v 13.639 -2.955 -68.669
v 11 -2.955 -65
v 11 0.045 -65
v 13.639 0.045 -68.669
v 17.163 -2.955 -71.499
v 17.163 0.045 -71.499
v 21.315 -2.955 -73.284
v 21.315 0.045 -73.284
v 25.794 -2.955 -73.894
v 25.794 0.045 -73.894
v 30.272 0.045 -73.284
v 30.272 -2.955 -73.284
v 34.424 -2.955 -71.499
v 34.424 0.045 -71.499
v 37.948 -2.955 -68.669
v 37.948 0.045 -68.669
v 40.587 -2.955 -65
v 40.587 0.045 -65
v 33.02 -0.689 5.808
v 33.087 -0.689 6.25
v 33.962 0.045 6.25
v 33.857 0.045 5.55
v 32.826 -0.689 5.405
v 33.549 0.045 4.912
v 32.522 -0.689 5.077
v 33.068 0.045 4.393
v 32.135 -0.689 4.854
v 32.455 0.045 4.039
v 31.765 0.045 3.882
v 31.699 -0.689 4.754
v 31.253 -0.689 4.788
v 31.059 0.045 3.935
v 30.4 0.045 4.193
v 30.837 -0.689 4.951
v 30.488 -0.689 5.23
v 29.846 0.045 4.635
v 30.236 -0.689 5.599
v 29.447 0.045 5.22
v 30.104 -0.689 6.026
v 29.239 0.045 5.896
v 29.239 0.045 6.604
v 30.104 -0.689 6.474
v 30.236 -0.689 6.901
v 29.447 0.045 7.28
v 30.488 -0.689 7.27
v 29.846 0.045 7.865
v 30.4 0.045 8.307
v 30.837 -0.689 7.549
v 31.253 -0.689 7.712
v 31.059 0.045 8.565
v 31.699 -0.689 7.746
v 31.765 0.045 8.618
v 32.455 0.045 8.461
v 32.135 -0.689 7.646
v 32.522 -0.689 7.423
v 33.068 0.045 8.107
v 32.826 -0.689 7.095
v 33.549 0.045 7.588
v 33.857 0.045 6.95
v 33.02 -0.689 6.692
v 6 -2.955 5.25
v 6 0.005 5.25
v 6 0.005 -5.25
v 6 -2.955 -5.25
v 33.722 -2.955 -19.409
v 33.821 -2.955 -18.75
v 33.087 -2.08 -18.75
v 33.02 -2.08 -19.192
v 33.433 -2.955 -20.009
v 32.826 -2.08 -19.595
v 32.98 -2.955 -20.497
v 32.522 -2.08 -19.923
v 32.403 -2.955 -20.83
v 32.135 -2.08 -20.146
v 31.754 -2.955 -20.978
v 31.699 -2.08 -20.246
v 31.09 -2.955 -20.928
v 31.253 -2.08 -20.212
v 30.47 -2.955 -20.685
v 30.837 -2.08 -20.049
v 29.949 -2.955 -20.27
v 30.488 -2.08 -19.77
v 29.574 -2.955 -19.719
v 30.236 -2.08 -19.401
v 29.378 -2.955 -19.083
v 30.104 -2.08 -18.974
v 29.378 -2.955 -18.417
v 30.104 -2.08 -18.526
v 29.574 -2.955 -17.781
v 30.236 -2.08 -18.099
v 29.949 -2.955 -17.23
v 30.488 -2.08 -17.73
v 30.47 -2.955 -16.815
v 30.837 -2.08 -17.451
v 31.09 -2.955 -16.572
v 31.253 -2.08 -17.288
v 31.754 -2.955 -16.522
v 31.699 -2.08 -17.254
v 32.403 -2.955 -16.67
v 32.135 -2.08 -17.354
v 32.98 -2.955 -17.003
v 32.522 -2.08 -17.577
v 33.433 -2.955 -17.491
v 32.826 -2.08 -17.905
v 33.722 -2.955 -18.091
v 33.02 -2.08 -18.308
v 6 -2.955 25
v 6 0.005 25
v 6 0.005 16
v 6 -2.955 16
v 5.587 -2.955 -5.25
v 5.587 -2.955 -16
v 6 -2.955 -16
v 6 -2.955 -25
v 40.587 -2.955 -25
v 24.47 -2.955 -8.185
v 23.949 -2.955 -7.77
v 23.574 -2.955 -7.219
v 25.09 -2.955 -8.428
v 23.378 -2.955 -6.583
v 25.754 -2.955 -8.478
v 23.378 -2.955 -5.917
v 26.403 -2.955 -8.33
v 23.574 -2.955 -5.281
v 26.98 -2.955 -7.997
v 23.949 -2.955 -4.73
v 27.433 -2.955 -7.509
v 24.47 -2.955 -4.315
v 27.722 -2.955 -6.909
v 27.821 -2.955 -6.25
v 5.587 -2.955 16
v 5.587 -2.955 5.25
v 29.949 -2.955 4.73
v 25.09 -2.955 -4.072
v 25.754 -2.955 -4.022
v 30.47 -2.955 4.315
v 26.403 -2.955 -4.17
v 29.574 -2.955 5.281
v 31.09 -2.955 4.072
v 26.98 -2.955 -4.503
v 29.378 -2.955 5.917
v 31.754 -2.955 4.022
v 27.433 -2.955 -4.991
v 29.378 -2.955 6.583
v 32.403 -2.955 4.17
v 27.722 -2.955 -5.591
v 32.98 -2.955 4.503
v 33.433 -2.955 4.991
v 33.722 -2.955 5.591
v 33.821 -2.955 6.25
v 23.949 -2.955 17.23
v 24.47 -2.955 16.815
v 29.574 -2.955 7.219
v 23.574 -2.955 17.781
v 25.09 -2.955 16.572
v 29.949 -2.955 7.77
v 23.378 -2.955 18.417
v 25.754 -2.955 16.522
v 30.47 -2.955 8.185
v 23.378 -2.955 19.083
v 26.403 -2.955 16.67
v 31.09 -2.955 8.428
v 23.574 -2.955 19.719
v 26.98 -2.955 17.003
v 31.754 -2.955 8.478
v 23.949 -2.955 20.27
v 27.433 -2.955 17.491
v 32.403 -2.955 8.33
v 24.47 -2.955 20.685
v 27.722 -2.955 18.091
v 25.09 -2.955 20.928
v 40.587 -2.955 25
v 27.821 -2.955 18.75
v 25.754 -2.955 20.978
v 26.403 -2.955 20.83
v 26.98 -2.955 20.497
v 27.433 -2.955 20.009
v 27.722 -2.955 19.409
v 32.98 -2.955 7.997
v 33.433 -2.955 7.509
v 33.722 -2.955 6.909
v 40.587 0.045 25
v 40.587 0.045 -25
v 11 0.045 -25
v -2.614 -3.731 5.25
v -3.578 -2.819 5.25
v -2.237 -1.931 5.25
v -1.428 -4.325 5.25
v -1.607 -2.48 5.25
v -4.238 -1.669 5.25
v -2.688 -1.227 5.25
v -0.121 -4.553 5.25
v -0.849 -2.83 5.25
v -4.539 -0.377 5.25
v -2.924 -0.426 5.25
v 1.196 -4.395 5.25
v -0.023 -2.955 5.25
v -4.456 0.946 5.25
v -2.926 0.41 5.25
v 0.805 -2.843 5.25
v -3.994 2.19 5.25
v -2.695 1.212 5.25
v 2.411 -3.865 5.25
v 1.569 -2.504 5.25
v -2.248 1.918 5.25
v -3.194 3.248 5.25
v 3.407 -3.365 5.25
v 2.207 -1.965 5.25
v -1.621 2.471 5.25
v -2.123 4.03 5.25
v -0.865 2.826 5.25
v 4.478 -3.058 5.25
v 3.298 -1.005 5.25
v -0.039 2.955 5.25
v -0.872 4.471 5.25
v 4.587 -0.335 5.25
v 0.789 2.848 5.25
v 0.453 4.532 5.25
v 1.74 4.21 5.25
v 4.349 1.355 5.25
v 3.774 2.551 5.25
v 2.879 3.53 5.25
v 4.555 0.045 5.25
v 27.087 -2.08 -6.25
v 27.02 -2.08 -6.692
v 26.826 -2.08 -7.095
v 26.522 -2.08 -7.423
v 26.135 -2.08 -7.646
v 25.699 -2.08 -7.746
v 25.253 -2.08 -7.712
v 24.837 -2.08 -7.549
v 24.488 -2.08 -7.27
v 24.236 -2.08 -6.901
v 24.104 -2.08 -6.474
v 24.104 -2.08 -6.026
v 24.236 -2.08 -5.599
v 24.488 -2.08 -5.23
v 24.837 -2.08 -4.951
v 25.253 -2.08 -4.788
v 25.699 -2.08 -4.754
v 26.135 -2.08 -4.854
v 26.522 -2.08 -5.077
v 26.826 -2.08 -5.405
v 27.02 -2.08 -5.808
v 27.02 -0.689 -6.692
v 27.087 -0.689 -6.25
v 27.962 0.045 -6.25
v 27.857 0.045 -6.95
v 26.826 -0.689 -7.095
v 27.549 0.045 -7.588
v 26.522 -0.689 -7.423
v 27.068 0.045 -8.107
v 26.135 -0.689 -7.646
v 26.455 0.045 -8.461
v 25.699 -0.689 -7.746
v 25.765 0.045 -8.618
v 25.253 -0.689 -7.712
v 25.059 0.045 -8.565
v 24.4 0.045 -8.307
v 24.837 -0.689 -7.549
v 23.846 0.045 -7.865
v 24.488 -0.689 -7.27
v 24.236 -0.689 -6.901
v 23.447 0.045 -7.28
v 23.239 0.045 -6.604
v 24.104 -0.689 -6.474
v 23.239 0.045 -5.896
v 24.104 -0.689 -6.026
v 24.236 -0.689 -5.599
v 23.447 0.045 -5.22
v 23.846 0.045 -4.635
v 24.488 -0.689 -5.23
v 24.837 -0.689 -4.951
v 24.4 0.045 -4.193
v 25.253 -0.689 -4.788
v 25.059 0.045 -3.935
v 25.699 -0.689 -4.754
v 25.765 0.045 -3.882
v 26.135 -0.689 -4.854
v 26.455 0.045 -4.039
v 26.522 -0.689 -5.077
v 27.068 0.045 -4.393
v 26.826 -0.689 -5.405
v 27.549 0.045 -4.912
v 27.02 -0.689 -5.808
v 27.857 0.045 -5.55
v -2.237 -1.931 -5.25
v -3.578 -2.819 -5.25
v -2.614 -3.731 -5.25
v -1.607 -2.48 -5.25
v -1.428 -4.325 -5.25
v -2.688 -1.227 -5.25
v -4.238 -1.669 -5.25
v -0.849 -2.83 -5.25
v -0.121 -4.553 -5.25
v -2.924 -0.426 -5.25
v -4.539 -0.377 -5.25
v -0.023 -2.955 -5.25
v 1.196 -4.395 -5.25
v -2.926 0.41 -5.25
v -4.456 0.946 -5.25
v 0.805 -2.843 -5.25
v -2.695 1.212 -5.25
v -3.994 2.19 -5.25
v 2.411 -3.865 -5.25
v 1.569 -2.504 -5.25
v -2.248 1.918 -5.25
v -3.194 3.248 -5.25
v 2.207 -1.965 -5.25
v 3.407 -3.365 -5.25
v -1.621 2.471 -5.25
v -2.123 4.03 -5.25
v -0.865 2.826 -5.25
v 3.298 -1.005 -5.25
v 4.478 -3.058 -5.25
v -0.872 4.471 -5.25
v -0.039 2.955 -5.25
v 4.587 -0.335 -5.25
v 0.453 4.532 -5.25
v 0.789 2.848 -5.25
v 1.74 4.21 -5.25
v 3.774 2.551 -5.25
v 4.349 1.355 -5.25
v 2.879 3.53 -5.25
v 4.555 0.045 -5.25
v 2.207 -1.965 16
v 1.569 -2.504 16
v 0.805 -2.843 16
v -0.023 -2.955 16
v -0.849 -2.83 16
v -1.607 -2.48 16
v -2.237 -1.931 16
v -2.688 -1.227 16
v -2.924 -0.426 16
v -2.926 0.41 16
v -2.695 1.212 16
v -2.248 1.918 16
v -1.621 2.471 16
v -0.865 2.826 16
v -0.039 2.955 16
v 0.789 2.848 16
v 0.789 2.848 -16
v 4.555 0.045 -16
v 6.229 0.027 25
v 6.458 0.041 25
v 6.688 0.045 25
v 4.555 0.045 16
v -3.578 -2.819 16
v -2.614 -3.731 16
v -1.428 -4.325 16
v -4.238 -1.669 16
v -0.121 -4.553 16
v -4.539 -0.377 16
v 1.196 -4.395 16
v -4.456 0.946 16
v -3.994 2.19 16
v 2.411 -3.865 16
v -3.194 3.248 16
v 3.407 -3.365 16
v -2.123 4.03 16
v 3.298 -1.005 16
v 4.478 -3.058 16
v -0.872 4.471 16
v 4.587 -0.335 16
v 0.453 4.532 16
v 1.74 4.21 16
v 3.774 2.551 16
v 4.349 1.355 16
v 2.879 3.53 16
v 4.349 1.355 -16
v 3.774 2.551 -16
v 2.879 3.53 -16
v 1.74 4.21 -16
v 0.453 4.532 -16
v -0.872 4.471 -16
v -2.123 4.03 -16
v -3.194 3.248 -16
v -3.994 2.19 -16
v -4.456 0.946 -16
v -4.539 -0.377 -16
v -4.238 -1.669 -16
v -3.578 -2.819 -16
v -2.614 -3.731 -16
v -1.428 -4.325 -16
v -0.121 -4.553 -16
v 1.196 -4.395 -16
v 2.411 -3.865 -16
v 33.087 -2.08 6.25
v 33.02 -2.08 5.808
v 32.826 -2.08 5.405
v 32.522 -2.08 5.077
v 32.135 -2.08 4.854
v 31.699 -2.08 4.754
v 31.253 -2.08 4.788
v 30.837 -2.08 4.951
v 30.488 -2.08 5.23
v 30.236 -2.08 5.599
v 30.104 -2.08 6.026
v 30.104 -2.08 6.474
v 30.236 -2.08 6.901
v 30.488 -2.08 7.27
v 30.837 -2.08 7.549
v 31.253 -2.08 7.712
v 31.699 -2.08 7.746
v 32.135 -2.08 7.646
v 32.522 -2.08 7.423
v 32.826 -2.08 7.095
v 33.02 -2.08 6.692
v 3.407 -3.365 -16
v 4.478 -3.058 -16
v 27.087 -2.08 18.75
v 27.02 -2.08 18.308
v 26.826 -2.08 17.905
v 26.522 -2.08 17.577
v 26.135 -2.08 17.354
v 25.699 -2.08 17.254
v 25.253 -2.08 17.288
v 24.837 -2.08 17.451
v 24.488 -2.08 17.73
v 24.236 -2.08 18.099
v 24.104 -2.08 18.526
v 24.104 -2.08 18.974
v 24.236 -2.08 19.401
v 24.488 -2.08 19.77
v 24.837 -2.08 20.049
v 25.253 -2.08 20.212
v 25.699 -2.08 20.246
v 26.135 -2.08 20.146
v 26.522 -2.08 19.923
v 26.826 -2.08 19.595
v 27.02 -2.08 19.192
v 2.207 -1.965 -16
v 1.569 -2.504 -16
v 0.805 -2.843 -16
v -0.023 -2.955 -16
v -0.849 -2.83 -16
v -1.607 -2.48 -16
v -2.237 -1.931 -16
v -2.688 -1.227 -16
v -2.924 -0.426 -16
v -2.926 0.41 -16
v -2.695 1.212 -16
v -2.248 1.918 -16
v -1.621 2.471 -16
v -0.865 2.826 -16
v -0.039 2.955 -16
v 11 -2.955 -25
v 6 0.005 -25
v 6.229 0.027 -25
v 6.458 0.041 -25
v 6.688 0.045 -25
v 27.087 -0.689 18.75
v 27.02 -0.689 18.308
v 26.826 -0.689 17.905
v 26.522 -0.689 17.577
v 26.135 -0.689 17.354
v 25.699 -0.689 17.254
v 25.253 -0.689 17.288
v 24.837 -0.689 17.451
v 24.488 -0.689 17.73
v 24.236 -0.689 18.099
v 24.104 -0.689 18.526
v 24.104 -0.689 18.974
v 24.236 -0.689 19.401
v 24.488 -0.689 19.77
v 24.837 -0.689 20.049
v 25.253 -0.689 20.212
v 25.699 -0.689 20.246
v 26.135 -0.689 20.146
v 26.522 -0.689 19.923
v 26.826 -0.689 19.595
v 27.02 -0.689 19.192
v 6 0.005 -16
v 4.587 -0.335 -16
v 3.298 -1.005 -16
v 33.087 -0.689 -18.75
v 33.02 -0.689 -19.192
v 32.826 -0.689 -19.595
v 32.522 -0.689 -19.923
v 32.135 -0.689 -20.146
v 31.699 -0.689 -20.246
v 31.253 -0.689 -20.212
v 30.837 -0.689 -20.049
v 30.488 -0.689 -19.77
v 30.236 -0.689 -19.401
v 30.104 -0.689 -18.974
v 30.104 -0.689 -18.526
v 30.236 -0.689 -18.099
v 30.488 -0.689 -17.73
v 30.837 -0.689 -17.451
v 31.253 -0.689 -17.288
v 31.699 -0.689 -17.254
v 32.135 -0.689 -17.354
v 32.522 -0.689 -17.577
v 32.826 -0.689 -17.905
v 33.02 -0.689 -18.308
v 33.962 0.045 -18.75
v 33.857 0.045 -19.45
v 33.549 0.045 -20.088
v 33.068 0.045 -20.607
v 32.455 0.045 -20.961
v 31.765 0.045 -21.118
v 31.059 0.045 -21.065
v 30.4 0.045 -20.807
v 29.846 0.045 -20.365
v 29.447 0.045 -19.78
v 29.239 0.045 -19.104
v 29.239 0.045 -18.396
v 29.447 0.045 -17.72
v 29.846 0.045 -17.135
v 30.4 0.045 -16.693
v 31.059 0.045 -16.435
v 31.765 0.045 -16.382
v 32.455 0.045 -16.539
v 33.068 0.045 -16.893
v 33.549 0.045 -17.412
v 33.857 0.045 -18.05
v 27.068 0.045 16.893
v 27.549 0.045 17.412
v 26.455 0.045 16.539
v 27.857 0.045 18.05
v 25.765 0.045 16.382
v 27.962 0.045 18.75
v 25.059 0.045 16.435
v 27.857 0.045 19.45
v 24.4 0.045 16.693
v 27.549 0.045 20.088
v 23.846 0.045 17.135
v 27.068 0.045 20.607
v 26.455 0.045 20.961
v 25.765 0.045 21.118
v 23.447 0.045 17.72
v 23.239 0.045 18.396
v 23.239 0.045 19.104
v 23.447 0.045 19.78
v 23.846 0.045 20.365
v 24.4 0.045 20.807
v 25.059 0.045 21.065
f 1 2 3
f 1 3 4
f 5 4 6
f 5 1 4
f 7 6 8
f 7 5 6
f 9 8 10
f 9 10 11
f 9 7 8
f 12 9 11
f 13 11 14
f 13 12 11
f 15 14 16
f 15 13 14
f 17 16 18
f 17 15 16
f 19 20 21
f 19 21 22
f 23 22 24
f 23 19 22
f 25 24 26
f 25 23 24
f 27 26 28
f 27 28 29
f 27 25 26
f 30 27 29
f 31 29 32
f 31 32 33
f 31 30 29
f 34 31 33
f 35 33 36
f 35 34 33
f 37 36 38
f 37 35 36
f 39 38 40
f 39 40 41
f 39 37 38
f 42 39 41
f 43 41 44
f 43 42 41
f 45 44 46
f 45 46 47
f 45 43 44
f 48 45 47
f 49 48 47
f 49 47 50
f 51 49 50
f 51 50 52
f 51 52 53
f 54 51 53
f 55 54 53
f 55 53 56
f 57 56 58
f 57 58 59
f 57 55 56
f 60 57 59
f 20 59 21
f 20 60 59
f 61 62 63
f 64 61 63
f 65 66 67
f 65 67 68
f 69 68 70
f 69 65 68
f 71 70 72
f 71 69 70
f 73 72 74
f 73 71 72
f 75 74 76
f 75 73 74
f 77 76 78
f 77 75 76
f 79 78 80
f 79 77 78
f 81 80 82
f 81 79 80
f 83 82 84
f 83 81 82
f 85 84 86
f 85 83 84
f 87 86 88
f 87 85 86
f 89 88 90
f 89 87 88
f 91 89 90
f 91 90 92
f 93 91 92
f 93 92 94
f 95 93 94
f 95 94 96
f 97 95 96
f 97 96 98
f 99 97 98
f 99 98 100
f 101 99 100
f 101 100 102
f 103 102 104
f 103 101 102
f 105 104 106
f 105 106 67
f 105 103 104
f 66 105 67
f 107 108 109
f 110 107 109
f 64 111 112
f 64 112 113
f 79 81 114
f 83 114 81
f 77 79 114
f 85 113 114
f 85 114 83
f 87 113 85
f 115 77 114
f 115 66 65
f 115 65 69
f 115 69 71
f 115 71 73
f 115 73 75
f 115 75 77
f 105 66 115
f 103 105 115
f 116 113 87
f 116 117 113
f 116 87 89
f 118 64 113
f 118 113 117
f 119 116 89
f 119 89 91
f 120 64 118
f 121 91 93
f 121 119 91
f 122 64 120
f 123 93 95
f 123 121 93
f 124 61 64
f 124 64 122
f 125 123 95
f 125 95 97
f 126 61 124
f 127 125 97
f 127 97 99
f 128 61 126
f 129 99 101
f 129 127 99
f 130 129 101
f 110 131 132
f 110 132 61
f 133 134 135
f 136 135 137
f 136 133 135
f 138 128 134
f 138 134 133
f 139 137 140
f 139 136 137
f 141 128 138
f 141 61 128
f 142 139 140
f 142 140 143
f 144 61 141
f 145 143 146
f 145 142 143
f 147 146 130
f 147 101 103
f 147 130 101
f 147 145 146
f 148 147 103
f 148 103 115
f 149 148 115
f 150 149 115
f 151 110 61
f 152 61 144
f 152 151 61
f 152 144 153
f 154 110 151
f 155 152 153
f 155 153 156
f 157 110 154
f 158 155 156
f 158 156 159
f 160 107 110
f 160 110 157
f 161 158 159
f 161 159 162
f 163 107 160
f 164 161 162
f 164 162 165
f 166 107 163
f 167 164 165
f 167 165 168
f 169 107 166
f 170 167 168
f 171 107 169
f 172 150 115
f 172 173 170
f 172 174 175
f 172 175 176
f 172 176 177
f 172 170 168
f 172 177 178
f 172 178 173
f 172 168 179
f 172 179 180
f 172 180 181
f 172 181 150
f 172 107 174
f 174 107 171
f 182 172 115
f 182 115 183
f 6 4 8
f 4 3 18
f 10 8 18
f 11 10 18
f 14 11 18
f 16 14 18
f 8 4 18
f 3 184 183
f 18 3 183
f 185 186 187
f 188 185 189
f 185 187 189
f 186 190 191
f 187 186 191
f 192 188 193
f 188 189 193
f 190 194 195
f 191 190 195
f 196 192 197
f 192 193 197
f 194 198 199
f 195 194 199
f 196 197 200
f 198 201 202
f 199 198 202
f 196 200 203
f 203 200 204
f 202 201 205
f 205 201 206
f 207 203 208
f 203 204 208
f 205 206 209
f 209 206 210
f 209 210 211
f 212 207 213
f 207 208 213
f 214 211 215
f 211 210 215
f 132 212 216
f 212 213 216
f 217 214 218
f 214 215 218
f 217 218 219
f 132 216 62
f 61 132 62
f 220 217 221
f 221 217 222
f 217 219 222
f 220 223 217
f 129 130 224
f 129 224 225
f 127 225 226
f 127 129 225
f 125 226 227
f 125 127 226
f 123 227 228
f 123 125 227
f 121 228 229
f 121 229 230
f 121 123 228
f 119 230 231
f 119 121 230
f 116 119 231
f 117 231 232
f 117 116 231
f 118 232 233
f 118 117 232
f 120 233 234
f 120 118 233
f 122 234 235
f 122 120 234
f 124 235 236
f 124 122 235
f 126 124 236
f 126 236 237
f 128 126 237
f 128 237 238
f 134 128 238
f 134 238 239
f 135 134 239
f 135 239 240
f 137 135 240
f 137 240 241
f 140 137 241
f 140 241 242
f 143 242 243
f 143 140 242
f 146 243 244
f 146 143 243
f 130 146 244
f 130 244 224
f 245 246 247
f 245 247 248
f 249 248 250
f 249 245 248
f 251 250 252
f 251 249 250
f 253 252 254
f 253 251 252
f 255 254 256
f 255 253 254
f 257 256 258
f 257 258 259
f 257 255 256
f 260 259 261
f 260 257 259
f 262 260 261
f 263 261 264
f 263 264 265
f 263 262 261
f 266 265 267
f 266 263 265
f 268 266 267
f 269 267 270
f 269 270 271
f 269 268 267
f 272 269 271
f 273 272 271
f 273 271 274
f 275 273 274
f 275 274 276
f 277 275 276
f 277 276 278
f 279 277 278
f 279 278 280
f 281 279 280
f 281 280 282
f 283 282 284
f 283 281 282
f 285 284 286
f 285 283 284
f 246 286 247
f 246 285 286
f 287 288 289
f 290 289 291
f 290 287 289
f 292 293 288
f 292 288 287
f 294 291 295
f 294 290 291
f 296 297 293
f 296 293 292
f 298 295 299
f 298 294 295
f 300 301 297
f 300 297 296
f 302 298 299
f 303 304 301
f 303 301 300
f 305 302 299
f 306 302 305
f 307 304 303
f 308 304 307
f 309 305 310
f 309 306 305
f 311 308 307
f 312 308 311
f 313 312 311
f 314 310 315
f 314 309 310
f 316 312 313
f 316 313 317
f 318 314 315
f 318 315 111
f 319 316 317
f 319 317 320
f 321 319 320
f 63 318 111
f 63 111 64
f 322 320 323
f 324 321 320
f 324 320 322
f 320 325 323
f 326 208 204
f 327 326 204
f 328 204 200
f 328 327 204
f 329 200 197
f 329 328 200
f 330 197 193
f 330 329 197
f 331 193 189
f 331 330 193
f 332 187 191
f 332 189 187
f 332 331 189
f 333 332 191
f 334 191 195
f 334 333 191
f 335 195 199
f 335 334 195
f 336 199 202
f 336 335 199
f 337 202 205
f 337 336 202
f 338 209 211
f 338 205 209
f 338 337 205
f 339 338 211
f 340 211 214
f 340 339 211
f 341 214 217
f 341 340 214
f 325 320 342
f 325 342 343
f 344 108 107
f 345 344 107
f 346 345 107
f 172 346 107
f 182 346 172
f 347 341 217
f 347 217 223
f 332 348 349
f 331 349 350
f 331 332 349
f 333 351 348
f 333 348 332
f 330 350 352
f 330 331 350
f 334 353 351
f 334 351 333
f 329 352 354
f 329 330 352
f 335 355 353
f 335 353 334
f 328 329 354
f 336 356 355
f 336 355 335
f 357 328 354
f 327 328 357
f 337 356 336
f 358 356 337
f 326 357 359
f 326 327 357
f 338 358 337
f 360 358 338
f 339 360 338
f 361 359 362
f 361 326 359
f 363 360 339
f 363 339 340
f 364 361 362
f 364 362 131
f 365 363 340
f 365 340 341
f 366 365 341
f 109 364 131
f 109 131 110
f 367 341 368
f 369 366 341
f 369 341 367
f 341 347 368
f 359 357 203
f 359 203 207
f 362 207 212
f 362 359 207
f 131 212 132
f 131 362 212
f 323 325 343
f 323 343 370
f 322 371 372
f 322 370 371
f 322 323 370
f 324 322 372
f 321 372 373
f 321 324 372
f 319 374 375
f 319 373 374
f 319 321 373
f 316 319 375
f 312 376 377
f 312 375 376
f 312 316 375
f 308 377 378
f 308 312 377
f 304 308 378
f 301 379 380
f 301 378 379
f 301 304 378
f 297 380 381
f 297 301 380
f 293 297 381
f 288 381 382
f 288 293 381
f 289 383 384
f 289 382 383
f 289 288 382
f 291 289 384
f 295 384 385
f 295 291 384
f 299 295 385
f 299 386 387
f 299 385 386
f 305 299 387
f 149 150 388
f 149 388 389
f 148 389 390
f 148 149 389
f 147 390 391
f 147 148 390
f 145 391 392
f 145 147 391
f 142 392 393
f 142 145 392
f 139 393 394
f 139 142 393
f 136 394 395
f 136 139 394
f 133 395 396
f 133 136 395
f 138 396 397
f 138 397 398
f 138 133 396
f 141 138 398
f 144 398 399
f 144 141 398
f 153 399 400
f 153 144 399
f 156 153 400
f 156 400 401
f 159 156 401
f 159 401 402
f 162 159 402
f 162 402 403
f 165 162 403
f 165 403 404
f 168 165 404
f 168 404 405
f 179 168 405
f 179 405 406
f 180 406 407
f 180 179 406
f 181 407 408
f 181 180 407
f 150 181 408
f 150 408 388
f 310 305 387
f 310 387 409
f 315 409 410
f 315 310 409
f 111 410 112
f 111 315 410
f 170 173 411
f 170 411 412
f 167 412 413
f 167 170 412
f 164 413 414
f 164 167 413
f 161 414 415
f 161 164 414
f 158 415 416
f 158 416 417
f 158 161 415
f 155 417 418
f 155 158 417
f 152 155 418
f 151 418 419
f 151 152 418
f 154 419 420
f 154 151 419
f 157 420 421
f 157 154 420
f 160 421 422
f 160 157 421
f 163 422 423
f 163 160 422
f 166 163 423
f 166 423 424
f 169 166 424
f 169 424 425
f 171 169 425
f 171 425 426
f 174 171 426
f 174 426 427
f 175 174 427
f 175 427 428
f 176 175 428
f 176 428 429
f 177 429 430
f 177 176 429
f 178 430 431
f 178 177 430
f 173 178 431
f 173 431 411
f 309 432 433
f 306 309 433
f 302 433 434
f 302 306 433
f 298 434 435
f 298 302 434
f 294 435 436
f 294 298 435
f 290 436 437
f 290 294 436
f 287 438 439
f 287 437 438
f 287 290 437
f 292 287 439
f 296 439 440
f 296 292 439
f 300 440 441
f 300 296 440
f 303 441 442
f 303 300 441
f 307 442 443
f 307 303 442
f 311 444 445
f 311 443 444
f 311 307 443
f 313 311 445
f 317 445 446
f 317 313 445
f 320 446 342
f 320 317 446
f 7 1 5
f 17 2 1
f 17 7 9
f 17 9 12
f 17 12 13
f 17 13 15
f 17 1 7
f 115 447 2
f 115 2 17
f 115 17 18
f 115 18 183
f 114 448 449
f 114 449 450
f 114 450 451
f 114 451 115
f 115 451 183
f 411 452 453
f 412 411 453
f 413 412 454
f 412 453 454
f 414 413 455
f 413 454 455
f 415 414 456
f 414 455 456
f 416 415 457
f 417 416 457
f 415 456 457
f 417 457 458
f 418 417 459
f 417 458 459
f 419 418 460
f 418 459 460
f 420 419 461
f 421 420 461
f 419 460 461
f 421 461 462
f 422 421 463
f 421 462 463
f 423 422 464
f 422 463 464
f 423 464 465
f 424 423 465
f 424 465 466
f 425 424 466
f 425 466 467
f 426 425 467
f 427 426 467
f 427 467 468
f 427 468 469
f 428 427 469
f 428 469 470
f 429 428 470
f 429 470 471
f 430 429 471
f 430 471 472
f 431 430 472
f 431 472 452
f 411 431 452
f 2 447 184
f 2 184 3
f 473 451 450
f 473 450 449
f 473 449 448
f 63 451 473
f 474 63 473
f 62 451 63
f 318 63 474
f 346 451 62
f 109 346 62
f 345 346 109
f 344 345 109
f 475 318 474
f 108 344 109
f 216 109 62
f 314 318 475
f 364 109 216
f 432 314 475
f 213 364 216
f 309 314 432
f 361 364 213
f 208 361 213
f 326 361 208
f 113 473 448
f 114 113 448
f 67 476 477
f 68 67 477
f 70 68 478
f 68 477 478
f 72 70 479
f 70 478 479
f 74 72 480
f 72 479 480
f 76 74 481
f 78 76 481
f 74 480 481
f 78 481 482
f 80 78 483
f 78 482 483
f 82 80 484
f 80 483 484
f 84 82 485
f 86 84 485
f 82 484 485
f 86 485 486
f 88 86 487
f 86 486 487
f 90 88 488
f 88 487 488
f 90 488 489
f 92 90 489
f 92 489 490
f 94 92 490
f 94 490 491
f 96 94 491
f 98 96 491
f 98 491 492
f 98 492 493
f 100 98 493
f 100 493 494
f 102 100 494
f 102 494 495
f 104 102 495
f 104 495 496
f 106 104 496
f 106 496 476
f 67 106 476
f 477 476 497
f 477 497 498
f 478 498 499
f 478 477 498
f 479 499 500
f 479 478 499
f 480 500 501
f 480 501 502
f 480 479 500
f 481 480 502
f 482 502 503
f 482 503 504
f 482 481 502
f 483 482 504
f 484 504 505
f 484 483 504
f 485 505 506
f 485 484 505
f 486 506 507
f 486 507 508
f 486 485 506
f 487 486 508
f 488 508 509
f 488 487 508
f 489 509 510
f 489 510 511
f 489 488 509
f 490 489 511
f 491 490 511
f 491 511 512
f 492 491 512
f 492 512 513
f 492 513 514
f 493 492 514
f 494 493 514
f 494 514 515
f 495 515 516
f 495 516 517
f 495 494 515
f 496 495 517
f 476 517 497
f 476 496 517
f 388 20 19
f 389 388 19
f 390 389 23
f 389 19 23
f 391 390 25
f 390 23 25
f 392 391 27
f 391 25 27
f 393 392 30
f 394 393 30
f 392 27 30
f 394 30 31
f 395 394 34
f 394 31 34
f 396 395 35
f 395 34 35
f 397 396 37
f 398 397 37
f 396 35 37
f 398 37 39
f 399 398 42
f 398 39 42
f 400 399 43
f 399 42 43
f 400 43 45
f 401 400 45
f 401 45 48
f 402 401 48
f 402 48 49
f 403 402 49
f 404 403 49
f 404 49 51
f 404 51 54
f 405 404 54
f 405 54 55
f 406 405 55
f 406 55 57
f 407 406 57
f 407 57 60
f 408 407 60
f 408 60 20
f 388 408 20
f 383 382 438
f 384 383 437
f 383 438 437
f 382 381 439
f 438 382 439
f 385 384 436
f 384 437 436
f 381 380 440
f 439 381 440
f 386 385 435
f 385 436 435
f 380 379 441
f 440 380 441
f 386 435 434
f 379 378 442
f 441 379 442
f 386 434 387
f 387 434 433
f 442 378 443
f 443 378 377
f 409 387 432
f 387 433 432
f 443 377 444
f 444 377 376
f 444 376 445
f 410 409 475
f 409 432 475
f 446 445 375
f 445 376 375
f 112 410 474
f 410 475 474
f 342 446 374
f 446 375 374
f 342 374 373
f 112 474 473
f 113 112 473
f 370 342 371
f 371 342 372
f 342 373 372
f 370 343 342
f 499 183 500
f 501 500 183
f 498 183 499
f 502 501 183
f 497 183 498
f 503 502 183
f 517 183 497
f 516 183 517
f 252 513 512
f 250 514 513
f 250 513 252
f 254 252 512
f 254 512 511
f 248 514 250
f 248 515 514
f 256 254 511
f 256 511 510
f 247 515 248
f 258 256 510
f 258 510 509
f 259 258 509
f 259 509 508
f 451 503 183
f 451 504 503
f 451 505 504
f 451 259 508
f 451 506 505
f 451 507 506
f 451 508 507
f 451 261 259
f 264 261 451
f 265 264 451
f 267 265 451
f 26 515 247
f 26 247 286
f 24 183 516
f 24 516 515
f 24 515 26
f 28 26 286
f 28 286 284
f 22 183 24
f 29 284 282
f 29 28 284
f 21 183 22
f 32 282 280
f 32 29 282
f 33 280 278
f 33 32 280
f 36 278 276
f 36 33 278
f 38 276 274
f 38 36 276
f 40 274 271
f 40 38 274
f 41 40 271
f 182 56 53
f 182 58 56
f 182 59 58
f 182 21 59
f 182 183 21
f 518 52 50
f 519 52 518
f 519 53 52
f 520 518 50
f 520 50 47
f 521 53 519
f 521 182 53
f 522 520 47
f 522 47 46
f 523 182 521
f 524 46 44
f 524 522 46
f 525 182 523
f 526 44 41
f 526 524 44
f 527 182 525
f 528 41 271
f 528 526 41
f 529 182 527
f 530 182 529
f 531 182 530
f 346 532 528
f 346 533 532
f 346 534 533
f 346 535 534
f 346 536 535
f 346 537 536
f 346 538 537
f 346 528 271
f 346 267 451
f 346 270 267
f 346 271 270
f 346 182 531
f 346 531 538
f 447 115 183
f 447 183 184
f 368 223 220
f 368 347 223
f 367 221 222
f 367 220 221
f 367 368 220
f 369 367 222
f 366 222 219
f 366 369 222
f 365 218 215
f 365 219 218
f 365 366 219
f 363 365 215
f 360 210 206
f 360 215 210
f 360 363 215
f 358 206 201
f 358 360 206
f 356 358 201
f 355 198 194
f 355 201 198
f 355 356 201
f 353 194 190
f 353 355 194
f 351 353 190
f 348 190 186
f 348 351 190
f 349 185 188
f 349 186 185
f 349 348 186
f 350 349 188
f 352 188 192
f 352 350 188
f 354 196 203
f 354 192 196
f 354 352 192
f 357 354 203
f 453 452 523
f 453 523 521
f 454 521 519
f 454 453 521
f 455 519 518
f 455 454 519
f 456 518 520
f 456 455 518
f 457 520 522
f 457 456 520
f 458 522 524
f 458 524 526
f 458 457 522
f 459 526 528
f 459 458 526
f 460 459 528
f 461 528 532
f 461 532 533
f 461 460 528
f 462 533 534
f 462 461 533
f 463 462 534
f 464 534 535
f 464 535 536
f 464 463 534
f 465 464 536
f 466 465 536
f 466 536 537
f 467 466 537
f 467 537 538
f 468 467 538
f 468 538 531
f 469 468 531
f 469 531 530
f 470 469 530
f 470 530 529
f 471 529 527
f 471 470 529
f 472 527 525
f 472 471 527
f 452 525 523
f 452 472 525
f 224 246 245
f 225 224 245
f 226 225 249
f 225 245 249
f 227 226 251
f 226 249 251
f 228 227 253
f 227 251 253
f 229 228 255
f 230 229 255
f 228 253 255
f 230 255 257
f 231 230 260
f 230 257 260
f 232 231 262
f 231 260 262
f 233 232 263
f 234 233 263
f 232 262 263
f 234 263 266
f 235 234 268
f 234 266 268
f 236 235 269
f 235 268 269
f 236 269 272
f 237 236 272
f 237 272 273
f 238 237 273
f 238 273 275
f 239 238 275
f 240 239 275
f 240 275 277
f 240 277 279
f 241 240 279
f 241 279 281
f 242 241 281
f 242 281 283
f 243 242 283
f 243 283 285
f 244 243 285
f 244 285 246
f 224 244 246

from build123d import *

# Parameters (mm, degrees)
BOSS_EXTRUDE1_DEPTH     = 25
SKETCH2_W               = 12
SKETCH2_H               = 10.5
SKETCH2_H_2             = 9.5
CUT_EXTRUDE1_DEPTH      = 6
CUT_EXTRUDE1_DEPTH_BACK = 6
SKETCH3_R               = 1.5
CUT_EXTRUDE2_DEPTH      = 6
CHAMFER1_SIZE           = 0.875
CHAMFER1_SIZE2          = 0.734212177
CHAMFER1_PART_2_SIZE    = 0.875
CHAMFER1_PART_2_SIZE2   = 0.734212177
CHAMFER1_PART_3_SIZE    = 0.875
CHAMFER1_PART_3_SIZE2   = 0.734212177
CHAMFER1_PART_4_SIZE    = 0.875
CHAMFER1_PART_4_SIZE2   = 0.734212177
CHAMFER1_PART_5_SIZE    = 0.875
CHAMFER1_PART_5_SIZE2   = 0.734212177
BOSS_EXTRUDE2_DEPTH     = 3


with BuildPart() as part:
    # Sketch1 → Boss-Extrude1 (new body, symmetric)
    with BuildSketch(Plane.XY):
        with BuildLine():
            Line((5.587128064, -2.955), (40.587128064, -2.955))
            Line((40.587128064, -2.955), (40.587128064, 0.045))
            Line((40.587128064, 0.045), (6.688049043, 0.045))
            ThreePointArc((6.688049043, 0.045), (4.232412516, -0.480527492), (2.206944157, -1.965050251))
            ThreePointArc((2.206944157, -1.965050251), (-2.834596442, -0.834917966), (0.789396387, 2.847609233))
            Line((0.789396387, 2.847609233), (4.554777711, 0.045))
            ThreePointArc((4.554777711, 0.045), (-3.993998166, 2.189978003), (2.41111969, -3.864521554))
            ThreePointArc((2.41111969, -3.864521554), (3.93529131, -3.186860323), (5.587128064, -2.955))
        make_face()
    extrude(amount=BOSS_EXTRUDE1_DEPTH, both=True)

    # Sketch2 → Cut-Extrude1 (cut, two sides)
    with BuildSketch(Plane(origin=(0, 0, 0), x_dir=(1, 0, 0), z_dir=(0, 1, 0))) as cut_extrude1_sk:
        Rectangle(SKETCH2_W, SKETCH2_H)
        with Locations((0, 20.75)):
            Rectangle(SKETCH2_W, SKETCH2_H_2)
        with Locations((0, -20.75)):
            Rectangle(SKETCH2_W, SKETCH2_H_2)
    extrude(amount=CUT_EXTRUDE1_DEPTH, mode=Mode.SUBTRACT)
    extrude(cut_extrude1_sk.sketch, amount=-CUT_EXTRUDE1_DEPTH_BACK, mode=Mode.SUBTRACT)

    # Sketch3 → Cut-Extrude2 (cut)
    with BuildSketch(Plane(origin=(0, 0.045, 0), x_dir=(1, 0, 0), z_dir=(0, 1, 0))):
        with Locations((31.587128064, 18.75)):
            Circle(SKETCH3_R)
        with Locations((25.587128064, 6.25)):
            Circle(SKETCH3_R)
        with Locations((31.587128064, -6.25)):
            Circle(SKETCH3_R)
        with Locations((25.587128064, -18.75)):
            Circle(SKETCH3_R)
    extrude(amount=-CUT_EXTRUDE2_DEPTH, mode=Mode.SUBTRACT)

    # Chamfer1
    chamfer1_edges = [part.edges().sort_by_distance(p)[0] for p in [
        (30.087128064, -2.955, 6.25),
    ]]
    chamfer1_side = [part.faces().sort_by_distance(p)[0] for p in [
        (30.087128064, -1.455, 6.25),
    ]]
    chamfer(chamfer1_edges, length=CHAMFER1_SIZE, length2=CHAMFER1_SIZE2, reference=chamfer1_side[0])

    # Chamfer1 part 2
    chamfer1_part_2_edges = [part.edges().sort_by_distance(p)[0] for p in [
        (30.087128064, 0.045, 6.25),
        (24.087128064, 0.045, 18.75),
        (30.087128064, 0.045, -18.75),
        (24.087128064, 0.045, -6.25),
    ]]
    chamfer1_part_2_side = [part.faces().sort_by_distance(p)[0] for p in [
        (23.553622246, 0.045, 0),
    ]]
    chamfer(chamfer1_part_2_edges, length=CHAMFER1_PART_2_SIZE, length2=CHAMFER1_PART_2_SIZE2, reference=chamfer1_part_2_side[0])

    # Chamfer1 part 3
    chamfer1_part_3_edges = [part.edges().sort_by_distance(p)[0] for p in [
        (24.087128064, -2.955, 18.75),
    ]]
    chamfer1_part_3_side = [part.faces().sort_by_distance(p)[0] for p in [
        (24.087128064, -1.455, 18.75),
    ]]
    chamfer(chamfer1_part_3_edges, length=CHAMFER1_PART_3_SIZE, length2=CHAMFER1_PART_3_SIZE2, reference=chamfer1_part_3_side[0])

    # Chamfer1 part 4
    chamfer1_part_4_edges = [part.edges().sort_by_distance(p)[0] for p in [
        (30.087128064, -2.955, -18.75),
    ]]
    chamfer1_part_4_side = [part.faces().sort_by_distance(p)[0] for p in [
        (30.087128064, -1.455, -18.75),
    ]]
    chamfer(chamfer1_part_4_edges, length=CHAMFER1_PART_4_SIZE, length2=CHAMFER1_PART_4_SIZE2, reference=chamfer1_part_4_side[0])

    # Chamfer1 part 5
    chamfer1_part_5_edges = [part.edges().sort_by_distance(p)[0] for p in [
        (24.087128064, -2.955, -6.25),
    ]]
    chamfer1_part_5_side = [part.faces().sort_by_distance(p)[0] for p in [
        (24.087128064, -1.455, -6.25),
    ]]
    chamfer(chamfer1_part_5_edges, length=CHAMFER1_PART_5_SIZE, length2=CHAMFER1_PART_5_SIZE2, reference=chamfer1_part_5_side[0])


with BuildPart() as body_2:
    # Sketch4 → Boss-Extrude2 (new body)
    with BuildSketch(Plane.XZ.offset(2.955)):
        with BuildLine():
            Line((40.587128064, -25), (11, -25))
            Line((11, -25), (11, -65))
            ThreePointArc((11, -65), (25.793564032, -73.894240124), (40.587128064, -65))
            Line((40.587128064, -65), (40.587128064, -25))
        make_face()
    extrude(amount=-BOSS_EXTRUDE2_DEPTH)


solid = Compound([part.part, body_2.part])
